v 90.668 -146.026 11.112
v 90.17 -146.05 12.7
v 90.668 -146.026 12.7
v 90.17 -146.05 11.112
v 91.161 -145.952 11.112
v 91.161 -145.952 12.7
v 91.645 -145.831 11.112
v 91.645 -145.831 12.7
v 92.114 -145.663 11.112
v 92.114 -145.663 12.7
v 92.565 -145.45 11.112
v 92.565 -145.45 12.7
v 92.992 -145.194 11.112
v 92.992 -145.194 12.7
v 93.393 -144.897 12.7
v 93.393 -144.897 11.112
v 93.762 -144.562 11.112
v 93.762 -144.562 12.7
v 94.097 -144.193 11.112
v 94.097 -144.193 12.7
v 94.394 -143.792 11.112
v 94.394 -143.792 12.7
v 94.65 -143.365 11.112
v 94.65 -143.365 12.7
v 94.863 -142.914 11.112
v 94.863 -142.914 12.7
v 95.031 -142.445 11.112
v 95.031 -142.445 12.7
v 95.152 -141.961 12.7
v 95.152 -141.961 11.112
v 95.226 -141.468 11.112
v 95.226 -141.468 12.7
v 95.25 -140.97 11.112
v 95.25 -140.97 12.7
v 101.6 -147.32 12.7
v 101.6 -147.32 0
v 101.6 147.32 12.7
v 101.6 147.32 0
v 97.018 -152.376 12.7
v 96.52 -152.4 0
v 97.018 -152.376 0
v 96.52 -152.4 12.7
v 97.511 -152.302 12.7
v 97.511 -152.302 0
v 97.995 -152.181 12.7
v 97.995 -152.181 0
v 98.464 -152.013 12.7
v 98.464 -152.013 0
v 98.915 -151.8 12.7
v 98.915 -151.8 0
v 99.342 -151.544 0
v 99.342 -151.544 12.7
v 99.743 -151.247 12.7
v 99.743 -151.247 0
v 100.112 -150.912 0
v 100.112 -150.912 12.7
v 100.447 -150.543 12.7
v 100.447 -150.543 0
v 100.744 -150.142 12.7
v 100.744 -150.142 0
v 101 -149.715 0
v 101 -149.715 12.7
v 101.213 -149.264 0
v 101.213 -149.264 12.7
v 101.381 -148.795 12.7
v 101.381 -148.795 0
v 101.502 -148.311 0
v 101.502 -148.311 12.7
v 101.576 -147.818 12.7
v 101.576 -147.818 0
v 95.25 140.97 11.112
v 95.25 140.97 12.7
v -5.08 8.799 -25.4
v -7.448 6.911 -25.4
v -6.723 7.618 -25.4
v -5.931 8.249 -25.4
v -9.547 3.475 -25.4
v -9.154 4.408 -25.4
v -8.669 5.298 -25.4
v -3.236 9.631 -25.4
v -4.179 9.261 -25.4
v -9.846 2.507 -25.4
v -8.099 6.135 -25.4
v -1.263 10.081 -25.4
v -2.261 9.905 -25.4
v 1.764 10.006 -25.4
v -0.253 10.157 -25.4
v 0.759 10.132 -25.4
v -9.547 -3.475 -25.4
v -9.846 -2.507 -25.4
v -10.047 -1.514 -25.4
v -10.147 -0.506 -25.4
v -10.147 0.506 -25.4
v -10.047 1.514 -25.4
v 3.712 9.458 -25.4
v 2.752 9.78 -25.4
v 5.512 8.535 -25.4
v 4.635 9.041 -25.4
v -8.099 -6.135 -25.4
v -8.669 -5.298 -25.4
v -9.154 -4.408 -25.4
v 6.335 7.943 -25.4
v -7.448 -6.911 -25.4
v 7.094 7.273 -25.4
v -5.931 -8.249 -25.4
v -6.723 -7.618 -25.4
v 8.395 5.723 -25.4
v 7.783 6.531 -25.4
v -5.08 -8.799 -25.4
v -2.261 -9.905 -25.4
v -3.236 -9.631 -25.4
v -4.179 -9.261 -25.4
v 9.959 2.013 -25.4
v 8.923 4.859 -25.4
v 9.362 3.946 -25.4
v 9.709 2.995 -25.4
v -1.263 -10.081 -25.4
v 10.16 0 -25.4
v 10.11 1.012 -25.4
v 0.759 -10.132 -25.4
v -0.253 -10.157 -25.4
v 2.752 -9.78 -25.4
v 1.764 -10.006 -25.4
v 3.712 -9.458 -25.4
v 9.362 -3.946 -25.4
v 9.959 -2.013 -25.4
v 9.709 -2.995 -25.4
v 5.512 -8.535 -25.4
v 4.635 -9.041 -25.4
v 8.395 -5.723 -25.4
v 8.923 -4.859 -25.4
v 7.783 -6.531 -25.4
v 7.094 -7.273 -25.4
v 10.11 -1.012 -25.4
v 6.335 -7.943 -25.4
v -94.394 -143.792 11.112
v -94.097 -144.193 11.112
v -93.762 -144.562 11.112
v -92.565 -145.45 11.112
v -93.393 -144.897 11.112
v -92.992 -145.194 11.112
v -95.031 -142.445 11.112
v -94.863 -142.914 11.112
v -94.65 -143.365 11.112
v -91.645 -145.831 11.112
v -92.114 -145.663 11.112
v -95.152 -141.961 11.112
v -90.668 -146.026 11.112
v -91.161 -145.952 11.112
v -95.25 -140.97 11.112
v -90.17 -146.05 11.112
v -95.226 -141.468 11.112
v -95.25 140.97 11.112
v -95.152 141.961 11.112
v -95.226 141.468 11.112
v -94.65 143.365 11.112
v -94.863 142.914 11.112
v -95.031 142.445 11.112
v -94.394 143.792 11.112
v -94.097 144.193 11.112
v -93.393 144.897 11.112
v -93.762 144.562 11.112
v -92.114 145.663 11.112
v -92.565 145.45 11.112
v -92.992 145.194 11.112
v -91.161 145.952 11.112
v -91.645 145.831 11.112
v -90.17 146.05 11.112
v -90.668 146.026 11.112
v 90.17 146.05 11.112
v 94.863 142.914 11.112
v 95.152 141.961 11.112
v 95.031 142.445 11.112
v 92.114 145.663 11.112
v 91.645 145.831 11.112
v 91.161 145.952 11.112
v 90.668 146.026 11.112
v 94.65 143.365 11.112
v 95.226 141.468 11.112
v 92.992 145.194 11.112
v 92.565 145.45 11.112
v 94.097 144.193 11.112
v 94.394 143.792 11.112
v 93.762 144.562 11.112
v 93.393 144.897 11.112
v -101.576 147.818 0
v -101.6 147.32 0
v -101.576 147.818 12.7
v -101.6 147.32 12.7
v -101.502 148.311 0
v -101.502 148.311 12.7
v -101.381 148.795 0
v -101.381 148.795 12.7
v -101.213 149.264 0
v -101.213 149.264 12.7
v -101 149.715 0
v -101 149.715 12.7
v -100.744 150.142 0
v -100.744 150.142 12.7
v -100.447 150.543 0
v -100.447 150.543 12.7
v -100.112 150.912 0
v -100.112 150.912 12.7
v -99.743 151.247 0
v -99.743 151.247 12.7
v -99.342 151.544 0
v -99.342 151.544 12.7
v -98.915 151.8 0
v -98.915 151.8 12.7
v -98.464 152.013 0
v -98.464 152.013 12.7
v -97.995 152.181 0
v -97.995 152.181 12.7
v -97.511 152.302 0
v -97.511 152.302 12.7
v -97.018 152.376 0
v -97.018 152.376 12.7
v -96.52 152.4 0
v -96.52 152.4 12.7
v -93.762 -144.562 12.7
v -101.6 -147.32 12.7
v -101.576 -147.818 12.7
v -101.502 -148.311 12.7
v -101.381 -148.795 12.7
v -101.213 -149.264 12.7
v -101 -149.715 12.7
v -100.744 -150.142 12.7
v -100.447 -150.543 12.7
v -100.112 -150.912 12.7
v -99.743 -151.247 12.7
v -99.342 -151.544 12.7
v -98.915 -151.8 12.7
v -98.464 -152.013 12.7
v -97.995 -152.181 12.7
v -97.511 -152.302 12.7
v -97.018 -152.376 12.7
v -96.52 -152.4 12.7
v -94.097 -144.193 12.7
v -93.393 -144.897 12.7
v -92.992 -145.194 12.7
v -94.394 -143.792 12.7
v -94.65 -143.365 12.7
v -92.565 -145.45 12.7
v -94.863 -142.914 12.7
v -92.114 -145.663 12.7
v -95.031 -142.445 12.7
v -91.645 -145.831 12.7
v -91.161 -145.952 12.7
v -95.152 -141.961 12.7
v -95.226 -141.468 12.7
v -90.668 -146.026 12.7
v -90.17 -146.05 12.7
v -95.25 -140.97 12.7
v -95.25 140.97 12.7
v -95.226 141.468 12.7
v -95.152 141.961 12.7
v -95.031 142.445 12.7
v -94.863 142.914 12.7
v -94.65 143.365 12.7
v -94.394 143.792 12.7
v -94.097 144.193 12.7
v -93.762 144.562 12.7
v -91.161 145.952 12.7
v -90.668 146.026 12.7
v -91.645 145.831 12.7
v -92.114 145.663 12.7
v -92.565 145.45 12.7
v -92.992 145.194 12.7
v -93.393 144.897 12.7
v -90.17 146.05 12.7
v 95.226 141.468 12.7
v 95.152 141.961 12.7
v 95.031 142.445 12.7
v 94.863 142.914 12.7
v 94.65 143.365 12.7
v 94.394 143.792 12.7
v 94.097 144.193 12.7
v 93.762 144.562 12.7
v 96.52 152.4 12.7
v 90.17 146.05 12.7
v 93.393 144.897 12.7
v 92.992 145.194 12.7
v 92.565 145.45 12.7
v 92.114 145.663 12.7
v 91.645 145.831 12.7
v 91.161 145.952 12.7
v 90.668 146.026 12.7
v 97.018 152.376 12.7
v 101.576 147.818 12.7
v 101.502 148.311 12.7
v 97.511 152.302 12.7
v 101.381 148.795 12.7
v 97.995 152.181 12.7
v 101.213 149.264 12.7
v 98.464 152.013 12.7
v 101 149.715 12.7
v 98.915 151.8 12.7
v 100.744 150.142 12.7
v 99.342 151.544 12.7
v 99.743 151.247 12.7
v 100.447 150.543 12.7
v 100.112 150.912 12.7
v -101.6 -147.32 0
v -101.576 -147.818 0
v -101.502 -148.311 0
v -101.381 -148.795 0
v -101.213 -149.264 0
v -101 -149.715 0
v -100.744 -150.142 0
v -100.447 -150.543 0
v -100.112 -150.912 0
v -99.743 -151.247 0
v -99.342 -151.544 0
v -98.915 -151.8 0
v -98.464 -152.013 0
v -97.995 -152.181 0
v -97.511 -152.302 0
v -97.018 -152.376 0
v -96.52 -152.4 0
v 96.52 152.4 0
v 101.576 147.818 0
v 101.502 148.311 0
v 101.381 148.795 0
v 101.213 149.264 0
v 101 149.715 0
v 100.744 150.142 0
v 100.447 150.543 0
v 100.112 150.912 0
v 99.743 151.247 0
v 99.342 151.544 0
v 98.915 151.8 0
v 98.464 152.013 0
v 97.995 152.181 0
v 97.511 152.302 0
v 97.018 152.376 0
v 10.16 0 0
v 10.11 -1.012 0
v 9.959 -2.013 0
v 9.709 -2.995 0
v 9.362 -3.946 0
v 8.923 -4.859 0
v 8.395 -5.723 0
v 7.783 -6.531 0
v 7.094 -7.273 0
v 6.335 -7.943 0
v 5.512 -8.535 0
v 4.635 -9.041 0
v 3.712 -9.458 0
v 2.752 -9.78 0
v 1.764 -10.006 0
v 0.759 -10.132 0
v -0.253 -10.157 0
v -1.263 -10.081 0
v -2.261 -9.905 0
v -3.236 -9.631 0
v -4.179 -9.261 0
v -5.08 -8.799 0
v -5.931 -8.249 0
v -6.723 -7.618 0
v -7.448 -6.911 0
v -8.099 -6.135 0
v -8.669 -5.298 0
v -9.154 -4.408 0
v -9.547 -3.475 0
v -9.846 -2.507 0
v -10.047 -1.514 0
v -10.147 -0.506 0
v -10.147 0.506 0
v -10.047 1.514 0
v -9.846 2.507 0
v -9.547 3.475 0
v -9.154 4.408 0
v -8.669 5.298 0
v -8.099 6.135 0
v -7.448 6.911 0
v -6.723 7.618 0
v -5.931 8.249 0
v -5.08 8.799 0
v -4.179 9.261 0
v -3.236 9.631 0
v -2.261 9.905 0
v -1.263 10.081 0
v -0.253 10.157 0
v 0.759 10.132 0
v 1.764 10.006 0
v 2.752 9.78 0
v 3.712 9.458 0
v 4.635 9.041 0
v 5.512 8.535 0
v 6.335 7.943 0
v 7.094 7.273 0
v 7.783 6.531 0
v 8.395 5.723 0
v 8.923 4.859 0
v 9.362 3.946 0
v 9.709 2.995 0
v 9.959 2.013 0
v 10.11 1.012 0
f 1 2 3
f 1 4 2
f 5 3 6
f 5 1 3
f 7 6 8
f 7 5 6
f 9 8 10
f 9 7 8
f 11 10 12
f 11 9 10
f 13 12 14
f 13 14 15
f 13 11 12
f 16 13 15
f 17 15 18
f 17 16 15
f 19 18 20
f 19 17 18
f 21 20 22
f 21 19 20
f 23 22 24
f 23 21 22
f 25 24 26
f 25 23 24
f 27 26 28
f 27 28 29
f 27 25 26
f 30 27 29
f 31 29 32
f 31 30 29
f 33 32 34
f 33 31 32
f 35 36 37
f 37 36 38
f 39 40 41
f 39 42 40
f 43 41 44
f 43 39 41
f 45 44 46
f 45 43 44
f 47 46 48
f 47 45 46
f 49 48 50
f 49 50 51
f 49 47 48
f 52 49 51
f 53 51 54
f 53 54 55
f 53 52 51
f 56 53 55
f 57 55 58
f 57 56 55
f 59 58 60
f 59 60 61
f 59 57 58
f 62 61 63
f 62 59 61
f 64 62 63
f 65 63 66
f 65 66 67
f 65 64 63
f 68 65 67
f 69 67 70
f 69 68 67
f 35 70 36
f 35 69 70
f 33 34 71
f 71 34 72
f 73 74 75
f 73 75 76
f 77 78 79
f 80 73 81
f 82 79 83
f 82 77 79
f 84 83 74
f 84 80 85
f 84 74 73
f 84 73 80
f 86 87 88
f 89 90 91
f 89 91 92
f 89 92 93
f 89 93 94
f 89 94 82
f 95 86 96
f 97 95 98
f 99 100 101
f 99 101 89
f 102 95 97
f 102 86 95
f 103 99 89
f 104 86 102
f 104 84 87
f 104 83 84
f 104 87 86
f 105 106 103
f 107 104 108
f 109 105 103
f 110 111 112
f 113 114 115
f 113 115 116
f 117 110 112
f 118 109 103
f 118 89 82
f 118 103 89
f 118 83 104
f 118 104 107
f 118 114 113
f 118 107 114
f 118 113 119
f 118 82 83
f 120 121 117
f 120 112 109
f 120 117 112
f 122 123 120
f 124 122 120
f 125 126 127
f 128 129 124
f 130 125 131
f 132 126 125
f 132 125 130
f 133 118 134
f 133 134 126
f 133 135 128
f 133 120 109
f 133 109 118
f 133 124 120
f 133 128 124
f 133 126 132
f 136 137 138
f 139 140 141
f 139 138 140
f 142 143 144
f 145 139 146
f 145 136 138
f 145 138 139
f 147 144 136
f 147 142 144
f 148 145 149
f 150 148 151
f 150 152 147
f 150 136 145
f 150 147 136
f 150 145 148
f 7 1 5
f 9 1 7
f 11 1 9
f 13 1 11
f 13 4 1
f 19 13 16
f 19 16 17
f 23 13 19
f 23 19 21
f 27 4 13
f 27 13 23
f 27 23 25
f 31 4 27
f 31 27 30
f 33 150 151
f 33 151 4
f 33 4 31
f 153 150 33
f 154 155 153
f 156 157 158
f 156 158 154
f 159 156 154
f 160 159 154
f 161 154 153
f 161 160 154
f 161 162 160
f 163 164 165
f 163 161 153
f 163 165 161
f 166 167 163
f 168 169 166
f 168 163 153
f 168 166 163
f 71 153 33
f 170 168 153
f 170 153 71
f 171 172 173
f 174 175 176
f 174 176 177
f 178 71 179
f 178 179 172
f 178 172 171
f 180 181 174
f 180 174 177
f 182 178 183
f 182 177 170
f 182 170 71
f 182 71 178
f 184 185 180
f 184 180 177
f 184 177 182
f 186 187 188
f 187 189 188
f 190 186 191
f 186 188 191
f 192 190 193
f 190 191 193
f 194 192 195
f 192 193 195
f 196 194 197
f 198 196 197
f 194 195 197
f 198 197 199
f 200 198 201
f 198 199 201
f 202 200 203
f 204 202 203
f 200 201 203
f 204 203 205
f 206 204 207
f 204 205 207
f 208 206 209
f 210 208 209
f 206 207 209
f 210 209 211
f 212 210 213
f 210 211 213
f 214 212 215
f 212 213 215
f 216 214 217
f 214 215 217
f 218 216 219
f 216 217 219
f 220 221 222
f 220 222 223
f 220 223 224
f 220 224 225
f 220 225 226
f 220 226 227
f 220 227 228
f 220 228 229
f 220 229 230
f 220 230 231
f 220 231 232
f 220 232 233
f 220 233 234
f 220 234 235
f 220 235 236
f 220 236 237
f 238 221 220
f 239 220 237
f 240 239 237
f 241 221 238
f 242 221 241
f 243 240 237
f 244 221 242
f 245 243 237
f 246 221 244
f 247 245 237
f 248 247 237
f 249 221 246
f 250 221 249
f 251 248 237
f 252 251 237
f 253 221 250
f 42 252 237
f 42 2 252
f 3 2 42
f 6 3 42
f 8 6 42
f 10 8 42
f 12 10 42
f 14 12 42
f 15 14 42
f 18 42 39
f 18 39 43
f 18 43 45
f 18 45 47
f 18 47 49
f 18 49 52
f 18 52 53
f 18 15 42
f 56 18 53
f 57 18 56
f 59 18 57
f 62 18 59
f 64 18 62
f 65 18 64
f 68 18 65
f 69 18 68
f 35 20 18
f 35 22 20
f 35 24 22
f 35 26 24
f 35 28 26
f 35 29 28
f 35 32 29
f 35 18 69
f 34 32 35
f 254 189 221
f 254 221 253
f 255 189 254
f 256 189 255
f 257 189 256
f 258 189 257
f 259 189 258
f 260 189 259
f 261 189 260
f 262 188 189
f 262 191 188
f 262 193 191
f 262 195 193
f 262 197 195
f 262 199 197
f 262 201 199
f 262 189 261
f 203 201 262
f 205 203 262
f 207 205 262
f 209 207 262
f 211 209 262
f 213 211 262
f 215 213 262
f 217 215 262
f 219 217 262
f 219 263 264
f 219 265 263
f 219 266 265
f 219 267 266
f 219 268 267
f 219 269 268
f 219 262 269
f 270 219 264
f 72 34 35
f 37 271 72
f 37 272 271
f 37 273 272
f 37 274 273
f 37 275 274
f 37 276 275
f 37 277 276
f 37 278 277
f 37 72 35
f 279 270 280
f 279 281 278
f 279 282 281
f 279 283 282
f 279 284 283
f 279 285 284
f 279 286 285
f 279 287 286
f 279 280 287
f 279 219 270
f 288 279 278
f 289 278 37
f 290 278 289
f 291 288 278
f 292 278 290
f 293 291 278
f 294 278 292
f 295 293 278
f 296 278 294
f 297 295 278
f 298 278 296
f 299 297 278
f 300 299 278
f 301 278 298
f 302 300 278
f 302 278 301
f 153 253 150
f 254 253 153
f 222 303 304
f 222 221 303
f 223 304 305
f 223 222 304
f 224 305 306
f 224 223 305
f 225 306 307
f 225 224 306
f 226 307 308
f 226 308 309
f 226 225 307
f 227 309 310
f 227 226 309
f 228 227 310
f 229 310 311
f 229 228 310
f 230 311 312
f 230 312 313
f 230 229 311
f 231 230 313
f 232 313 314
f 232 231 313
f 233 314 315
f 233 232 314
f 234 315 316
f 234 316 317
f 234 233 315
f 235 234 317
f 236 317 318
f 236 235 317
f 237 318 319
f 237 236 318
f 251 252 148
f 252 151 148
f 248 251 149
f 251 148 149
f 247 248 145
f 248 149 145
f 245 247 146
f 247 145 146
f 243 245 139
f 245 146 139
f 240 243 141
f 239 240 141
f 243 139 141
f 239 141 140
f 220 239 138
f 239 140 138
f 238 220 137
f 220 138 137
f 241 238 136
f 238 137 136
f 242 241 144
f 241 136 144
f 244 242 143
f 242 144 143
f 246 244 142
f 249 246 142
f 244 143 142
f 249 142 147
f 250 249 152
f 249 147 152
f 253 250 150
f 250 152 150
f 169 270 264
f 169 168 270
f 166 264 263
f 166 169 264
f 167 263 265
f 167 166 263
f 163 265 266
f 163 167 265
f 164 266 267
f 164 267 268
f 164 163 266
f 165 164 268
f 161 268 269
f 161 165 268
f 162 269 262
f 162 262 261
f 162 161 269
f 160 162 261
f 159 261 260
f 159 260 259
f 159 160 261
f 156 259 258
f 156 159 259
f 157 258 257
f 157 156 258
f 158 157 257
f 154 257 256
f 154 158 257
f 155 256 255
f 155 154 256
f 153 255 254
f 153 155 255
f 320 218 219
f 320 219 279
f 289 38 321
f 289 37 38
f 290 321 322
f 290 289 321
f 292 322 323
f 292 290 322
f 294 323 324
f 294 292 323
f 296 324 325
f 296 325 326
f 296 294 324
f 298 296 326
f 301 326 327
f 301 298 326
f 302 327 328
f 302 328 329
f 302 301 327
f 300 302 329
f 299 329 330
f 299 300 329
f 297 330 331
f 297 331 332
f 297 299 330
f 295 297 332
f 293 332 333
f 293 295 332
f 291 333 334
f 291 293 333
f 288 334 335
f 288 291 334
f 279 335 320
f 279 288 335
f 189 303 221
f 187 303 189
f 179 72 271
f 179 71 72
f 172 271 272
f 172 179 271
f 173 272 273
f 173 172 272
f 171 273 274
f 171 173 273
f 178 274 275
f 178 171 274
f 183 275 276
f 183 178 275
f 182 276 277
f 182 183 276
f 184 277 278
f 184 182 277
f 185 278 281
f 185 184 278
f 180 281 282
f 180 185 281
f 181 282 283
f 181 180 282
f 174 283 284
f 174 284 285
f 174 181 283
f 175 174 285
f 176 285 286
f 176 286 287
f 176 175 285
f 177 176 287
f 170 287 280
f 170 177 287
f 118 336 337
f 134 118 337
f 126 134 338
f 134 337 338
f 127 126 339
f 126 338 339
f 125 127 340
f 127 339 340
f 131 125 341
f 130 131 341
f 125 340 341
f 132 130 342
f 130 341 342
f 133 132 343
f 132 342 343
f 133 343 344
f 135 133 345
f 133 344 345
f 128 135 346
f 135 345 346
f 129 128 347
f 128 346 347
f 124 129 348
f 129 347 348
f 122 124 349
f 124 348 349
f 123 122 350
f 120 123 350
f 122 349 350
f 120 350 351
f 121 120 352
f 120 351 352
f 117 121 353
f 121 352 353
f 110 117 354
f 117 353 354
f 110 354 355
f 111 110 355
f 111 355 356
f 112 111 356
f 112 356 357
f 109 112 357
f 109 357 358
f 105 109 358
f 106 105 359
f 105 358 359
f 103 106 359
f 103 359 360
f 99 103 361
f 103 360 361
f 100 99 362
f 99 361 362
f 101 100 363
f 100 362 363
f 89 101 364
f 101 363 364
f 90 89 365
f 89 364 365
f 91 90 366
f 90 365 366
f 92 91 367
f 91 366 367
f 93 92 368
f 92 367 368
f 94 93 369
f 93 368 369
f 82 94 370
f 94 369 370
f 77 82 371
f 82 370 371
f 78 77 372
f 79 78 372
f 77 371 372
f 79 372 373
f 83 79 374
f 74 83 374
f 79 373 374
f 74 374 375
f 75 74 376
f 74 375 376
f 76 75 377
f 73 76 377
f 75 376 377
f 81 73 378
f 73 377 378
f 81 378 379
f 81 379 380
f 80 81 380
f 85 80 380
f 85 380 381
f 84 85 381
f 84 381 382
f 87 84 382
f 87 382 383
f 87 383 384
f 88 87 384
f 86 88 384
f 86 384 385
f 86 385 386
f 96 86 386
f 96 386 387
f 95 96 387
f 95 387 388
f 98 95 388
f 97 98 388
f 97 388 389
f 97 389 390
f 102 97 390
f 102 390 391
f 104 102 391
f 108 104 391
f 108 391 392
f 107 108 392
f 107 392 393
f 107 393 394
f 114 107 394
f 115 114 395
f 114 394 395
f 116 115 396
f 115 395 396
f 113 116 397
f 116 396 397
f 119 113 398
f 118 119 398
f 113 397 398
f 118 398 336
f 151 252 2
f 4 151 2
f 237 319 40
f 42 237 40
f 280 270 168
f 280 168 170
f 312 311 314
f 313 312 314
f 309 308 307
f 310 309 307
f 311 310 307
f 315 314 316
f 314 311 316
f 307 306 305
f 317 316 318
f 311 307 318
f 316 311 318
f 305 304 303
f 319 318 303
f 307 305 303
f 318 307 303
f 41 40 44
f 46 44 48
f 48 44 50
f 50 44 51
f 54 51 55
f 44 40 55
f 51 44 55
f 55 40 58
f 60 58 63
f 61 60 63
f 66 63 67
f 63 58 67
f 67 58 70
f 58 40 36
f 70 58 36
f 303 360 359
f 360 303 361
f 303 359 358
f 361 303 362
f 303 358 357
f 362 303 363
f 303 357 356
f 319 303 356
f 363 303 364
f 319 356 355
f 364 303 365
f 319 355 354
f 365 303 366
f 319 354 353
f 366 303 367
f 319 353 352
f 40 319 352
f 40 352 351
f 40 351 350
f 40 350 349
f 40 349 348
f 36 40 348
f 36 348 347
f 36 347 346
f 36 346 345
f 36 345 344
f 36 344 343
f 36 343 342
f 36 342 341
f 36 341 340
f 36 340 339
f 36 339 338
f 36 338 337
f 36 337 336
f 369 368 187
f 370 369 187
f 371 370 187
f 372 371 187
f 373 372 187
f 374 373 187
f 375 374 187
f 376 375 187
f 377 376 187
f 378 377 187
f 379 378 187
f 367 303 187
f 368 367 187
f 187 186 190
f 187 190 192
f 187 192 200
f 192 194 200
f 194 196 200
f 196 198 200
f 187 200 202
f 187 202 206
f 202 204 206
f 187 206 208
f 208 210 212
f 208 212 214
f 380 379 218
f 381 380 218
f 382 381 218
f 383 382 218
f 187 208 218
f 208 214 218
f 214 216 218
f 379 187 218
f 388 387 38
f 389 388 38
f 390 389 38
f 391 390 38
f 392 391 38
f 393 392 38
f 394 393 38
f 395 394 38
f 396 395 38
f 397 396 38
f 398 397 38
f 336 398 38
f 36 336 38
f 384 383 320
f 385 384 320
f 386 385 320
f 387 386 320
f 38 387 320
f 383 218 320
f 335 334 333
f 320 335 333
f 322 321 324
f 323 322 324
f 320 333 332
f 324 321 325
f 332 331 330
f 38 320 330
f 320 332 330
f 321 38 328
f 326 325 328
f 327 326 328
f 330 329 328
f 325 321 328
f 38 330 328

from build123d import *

# Parameters (mm, degrees)
F0_W     = 203.2
F0_H     = 304.8
F1_DEPTH = 12.7
F2_R     = 5.08
F3_W     = 190.5
F3_H     = 292.1
F4_DEPTH = 1.5875
F5_R     = 5.08
F6_R     = 10.16
F7_DEPTH = 25.4


with BuildPart() as f1:
    # F0 (on Top) → F1 (new body)
    with BuildSketch(Plane.XY):
        Rectangle(F0_W, F0_H)
    extrude(amount=F1_DEPTH)

    # F2
    f2_edges = [f1.edges().sort_by_distance(p)[0] for p in [
        (-101.6, 152.4, 6.35),
        (-101.6, -152.4, 6.35),
        (101.6, -152.4, 6.35),
        (101.6, 152.4, 6.35),
    ]]
    fillet(f2_edges, radius=F2_R)

    # F3 (on face) → F4 (cut)
    with BuildSketch(Plane.XY.offset(12.7)):
        Rectangle(F3_W, F3_H)
    extrude(amount=-F4_DEPTH, mode=Mode.SUBTRACT)

    # F5
    f5_edges = [f1.edges().sort_by_distance(p)[0] for p in [
        (95.25, -146.05, 11.90625),
        (-95.25, -146.05, 11.90625),
        (95.25, 146.05, 11.90625),
        (-95.25, 146.05, 11.90625),
    ]]
    fillet(f5_edges, radius=F5_R)

    # F6 (on face) → F7 (join)
    with BuildSketch(Plane(origin=(0, 0, 0), x_dir=(1, 0, 0), z_dir=(0, 0, -1))):
        Circle(F6_R)
    extrude(amount=F7_DEPTH)


solid = f1.part
